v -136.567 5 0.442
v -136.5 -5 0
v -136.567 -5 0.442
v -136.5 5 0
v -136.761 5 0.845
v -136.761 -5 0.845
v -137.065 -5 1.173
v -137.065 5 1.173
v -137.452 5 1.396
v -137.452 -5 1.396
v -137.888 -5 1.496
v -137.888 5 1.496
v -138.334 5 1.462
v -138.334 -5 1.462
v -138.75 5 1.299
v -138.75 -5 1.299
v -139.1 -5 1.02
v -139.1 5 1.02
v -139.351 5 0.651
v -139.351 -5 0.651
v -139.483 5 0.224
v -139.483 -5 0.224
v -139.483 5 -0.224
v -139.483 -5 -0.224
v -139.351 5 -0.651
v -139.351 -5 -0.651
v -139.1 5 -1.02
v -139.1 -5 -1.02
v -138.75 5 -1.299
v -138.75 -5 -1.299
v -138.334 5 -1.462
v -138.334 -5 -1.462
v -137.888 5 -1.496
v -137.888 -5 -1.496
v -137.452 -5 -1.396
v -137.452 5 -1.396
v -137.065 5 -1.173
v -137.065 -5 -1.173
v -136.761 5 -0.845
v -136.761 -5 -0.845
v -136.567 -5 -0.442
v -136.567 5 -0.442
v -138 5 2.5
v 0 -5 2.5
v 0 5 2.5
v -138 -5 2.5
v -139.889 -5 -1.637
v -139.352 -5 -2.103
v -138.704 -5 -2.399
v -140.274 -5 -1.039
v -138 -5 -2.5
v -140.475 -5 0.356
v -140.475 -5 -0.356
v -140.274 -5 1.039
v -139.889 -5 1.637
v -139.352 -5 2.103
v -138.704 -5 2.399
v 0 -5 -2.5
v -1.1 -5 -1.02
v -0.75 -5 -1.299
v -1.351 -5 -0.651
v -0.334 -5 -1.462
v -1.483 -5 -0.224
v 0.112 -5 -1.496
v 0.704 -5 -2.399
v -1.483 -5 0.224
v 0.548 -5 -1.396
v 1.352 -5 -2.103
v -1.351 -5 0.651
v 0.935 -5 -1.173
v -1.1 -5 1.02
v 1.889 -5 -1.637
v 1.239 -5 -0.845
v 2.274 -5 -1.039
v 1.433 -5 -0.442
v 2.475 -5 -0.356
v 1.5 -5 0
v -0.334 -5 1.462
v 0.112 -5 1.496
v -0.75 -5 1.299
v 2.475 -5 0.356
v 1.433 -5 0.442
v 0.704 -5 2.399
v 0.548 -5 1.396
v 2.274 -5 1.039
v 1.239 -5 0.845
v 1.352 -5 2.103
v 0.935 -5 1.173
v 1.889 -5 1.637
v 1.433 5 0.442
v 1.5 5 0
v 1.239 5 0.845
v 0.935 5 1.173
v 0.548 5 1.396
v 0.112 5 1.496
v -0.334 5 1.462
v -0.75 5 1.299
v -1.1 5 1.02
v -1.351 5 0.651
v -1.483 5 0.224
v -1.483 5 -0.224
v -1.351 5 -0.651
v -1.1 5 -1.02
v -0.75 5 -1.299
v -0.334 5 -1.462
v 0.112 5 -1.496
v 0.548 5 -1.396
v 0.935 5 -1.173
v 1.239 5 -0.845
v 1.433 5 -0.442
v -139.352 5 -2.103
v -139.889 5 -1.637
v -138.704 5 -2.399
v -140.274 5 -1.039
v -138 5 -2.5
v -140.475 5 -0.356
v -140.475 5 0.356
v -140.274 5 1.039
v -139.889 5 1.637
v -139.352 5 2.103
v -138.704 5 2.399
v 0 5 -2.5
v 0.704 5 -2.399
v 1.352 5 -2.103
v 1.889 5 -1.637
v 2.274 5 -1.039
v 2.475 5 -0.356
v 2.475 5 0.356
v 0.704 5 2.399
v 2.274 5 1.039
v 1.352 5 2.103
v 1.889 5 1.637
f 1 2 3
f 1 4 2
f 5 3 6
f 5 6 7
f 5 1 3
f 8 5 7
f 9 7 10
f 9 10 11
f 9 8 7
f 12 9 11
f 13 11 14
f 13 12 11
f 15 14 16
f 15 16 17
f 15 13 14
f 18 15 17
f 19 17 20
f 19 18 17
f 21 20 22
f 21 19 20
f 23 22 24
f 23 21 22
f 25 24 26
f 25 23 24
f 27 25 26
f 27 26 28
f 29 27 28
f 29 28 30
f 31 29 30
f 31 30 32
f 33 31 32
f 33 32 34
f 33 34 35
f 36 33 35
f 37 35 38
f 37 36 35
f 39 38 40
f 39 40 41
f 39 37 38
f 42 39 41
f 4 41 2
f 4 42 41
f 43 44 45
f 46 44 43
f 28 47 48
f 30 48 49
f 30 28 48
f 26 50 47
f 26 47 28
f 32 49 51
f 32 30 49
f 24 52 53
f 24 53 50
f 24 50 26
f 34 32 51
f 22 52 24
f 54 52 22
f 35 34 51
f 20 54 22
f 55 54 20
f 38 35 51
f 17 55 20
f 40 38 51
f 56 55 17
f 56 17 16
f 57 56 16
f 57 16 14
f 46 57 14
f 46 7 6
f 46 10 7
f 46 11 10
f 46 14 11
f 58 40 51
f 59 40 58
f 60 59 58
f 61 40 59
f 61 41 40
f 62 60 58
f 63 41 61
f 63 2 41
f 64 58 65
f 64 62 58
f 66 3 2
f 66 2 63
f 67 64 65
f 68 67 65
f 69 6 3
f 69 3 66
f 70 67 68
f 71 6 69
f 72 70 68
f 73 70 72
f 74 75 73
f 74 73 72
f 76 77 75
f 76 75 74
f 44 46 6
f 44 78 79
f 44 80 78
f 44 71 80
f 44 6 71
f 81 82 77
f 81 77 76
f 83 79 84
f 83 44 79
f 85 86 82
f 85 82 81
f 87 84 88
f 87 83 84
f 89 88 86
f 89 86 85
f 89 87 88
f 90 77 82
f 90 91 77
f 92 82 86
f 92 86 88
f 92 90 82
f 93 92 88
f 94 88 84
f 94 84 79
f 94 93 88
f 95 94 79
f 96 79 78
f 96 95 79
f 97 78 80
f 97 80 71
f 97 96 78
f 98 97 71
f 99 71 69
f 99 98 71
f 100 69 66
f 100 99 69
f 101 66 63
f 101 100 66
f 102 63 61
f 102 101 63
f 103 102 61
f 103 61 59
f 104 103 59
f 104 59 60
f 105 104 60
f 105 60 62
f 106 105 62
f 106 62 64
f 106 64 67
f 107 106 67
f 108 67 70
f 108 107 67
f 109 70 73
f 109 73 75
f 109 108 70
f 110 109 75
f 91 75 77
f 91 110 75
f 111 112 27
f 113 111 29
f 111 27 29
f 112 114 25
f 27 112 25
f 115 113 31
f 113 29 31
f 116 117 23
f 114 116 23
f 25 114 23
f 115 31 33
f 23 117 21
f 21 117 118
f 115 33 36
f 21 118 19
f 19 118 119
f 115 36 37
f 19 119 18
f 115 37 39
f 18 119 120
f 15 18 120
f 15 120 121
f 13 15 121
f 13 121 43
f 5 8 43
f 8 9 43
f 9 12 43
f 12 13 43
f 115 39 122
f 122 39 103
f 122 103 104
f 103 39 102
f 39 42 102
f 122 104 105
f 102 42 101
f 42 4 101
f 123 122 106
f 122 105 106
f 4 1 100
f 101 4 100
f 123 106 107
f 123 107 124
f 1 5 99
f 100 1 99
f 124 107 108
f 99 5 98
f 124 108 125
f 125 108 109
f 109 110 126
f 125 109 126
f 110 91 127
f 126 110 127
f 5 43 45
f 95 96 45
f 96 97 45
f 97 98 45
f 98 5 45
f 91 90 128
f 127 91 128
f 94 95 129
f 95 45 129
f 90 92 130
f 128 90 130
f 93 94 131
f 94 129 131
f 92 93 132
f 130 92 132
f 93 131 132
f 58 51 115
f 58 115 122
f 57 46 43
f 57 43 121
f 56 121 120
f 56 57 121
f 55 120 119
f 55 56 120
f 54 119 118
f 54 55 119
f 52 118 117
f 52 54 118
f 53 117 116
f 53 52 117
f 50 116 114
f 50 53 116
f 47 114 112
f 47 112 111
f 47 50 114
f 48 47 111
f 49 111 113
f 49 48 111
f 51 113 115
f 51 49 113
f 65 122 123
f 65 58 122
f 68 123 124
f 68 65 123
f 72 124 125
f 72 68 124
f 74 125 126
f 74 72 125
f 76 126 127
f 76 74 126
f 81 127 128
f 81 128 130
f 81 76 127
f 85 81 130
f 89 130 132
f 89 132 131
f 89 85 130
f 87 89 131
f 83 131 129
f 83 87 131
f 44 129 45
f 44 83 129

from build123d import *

# Parameters (mm, degrees)
F0_R     = 1.5
F1_DEPTH = 5


with BuildPart() as f1:
    # F0 (on Front) → F1 (new body, symmetric)
    with BuildSketch(Plane.XZ):
        with BuildLine():
            Line((0, 2.5), (-138.000001, 2.5))
            ThreePointArc((-138.000001, 2.5), (-140.5, 0), (-138, -2.5))
            Line((-138, -2.5), (0, -2.5))
            ThreePointArc((0, -2.5), (2.5, 0), (0, 2.5))
        make_face()
        with Locations((-138, 0)):
            Circle(F0_R, mode=Mode.SUBTRACT)
        Circle(F0_R, mode=Mode.SUBTRACT)
    extrude(amount=F1_DEPTH, both=True)


solid = f1.part
